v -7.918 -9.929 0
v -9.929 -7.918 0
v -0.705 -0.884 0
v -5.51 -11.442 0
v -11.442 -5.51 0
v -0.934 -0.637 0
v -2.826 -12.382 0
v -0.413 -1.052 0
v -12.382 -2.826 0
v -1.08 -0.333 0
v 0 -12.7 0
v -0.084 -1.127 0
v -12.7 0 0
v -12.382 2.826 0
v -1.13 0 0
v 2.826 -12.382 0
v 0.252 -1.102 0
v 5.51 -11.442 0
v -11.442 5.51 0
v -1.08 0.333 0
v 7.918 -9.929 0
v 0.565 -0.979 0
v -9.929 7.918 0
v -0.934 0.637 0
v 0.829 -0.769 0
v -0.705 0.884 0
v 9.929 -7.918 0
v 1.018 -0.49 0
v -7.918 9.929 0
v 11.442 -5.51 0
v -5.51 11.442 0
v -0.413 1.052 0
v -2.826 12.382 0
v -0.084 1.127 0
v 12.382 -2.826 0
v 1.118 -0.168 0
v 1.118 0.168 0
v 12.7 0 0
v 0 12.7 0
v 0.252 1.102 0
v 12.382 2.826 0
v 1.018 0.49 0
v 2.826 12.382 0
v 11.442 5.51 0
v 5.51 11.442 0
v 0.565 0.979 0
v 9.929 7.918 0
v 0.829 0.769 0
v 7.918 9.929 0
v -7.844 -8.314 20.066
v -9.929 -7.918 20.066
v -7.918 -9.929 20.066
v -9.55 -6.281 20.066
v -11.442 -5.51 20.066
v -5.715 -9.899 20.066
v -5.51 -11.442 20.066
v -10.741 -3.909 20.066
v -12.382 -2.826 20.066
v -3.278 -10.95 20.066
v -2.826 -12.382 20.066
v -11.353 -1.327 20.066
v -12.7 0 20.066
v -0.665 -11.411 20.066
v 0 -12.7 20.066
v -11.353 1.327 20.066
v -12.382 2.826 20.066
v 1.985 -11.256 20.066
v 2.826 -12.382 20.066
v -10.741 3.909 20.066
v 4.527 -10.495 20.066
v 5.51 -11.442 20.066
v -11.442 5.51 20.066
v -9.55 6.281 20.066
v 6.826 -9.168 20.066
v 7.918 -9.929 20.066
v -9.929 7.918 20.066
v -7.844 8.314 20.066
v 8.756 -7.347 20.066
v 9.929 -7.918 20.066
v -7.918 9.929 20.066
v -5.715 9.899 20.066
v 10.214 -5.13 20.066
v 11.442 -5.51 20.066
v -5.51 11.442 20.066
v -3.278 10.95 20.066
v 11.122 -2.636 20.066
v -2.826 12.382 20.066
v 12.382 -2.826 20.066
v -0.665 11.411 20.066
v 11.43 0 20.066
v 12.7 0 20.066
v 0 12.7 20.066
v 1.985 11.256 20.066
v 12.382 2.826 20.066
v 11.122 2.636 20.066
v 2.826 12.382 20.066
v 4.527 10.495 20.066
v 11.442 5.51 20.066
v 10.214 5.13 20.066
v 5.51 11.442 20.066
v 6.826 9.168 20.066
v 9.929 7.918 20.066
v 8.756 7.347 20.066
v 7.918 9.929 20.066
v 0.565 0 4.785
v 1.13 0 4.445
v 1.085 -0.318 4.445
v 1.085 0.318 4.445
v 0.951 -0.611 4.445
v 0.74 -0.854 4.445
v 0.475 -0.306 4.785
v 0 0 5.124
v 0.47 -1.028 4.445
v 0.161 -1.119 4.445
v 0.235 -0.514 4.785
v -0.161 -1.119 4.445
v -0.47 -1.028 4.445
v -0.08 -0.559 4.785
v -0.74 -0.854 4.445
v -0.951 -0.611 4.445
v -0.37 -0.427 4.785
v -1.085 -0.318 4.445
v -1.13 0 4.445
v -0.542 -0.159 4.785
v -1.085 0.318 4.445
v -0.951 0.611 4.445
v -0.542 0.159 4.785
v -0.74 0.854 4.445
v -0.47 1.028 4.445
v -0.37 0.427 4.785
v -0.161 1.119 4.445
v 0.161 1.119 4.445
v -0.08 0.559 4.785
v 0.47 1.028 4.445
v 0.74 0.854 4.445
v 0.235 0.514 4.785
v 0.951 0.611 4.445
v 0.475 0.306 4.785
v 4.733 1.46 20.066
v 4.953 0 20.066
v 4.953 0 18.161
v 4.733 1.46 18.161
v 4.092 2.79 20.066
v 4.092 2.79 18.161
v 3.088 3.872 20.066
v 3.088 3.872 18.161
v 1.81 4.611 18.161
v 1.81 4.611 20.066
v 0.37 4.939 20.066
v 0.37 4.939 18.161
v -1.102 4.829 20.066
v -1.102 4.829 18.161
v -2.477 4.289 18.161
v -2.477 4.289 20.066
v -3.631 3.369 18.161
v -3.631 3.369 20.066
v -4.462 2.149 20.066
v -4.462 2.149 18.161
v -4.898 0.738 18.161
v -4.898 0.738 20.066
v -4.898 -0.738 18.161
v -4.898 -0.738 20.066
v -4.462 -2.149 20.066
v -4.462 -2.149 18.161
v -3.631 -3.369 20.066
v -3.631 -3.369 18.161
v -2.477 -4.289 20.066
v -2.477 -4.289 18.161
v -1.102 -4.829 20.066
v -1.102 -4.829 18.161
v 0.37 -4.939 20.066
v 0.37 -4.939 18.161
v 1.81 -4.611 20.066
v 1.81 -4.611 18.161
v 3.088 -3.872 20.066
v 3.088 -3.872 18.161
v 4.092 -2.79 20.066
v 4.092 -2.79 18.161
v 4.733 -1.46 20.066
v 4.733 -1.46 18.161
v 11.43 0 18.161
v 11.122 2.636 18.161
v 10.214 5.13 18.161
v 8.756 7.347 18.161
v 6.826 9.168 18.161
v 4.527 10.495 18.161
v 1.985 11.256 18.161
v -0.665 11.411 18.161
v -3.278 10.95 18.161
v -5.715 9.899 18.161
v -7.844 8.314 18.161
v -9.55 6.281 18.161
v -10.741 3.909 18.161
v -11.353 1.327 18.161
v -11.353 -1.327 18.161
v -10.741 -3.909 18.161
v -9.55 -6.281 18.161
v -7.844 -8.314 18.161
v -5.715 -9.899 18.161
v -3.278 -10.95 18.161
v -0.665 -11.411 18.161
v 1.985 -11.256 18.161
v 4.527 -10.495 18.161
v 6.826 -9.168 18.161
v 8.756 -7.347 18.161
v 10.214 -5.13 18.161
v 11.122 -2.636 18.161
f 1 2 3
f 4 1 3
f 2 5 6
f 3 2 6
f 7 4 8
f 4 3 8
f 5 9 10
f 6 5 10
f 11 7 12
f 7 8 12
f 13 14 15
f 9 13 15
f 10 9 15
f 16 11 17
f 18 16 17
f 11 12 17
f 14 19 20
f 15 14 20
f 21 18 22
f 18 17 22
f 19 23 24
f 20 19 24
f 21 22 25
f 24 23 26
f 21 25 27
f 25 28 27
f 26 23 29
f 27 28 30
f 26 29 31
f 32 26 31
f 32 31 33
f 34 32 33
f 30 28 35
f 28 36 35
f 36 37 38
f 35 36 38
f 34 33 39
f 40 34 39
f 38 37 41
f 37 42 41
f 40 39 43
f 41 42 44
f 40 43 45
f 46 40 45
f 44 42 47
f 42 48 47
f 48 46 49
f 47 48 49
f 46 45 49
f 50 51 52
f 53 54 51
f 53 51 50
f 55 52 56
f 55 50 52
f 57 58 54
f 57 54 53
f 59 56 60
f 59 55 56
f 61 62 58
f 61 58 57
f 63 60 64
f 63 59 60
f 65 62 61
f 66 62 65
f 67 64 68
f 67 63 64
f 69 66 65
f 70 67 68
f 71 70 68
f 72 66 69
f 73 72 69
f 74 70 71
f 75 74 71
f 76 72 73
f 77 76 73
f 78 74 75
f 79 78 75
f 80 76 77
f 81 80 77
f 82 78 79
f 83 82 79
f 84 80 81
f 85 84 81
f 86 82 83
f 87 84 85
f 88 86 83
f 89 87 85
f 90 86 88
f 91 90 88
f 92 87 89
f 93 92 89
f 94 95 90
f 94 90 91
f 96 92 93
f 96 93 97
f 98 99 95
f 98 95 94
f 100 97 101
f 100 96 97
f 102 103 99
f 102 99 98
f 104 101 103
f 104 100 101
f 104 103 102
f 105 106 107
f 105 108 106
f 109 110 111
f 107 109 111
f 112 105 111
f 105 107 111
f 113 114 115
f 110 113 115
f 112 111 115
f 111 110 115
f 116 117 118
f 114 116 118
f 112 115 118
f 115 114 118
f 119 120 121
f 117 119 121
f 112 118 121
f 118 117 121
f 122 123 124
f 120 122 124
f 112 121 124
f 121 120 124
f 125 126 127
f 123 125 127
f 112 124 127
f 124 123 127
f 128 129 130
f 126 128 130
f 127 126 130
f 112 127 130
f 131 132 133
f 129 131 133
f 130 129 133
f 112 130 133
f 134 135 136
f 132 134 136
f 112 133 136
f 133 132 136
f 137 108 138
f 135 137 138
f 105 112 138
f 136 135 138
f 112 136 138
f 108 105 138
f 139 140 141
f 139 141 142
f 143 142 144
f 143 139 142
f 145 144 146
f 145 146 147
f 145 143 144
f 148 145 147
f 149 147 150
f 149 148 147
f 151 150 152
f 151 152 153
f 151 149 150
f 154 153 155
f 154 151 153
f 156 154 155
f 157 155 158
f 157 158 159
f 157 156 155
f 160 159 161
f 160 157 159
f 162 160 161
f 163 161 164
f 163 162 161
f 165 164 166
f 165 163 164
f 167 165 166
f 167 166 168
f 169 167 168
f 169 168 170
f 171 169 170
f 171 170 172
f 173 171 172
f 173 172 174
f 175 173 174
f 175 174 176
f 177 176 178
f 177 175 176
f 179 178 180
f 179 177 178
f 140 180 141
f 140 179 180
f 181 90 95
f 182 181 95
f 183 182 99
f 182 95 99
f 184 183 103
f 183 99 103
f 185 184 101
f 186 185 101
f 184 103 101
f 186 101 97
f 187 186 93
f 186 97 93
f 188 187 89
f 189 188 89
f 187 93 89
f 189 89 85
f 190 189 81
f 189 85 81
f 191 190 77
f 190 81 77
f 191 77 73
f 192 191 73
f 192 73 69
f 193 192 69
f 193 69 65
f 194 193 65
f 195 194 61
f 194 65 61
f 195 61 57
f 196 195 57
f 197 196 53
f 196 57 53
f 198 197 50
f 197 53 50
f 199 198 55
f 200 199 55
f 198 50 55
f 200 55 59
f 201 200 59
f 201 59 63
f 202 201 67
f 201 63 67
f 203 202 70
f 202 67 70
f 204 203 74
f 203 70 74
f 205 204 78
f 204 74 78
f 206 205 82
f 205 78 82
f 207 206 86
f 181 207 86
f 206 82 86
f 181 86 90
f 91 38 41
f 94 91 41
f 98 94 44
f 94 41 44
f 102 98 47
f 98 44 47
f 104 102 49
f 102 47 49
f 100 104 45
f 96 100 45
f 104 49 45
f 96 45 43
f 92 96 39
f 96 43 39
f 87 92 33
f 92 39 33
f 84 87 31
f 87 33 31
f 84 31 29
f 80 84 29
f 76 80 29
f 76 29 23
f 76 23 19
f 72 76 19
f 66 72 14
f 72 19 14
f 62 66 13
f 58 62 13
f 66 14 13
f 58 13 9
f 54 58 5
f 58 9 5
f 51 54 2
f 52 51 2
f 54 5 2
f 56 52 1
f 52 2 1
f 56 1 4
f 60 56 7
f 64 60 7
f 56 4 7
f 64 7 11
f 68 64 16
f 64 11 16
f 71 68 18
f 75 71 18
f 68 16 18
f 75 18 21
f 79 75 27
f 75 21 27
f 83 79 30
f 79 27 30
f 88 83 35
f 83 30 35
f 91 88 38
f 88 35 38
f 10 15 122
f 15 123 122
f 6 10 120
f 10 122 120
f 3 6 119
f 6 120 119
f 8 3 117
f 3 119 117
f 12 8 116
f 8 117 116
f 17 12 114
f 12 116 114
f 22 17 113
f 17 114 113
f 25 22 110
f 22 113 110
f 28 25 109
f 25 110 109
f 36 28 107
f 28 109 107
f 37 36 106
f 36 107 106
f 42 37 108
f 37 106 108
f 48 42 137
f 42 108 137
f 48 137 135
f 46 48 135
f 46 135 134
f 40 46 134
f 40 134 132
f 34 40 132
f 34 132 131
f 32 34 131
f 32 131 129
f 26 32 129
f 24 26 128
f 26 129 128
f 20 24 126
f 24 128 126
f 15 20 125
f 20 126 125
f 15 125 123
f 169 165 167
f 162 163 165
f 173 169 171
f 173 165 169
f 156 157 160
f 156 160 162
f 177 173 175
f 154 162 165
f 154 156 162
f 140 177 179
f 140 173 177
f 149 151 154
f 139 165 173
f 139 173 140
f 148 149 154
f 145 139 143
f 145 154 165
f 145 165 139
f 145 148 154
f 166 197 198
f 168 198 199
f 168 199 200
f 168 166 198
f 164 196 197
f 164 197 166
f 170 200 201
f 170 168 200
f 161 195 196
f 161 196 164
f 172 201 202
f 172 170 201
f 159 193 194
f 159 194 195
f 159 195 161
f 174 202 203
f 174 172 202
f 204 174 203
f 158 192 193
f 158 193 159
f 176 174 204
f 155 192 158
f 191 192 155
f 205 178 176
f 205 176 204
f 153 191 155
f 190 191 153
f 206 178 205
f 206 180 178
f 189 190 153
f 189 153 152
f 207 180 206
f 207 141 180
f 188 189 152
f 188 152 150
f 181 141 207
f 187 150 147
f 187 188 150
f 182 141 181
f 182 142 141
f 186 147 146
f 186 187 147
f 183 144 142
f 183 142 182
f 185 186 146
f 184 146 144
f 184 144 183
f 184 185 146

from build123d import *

# Parameters (mm, degrees)
F0_R     = 12.7
F1_DEPTH = 20.066
F2_R     = 11.43
F2_R_2   = 4.953
F3_DEPTH = 1.905
F5_D     = 2.2606
F5_DEPTH = 4.445
F5_TIP   = 0.6791527577


with BuildPart() as f1:
    # F0 (on Top) → F1 (new body)
    with BuildSketch(Plane.XY):
        Circle(F0_R)
    extrude(amount=F1_DEPTH)

    # F2 (on face) → F3 (cut)
    with BuildSketch(Plane.XY.offset(20.066)):
        Circle(F2_R)
        Circle(F2_R_2, mode=Mode.SUBTRACT)
    extrude(amount=-F3_DEPTH, mode=Mode.SUBTRACT)

    # F5
    with Locations(Plane(origin=(0, 0, 0), x_dir=(1, 0, 0), z_dir=(0, 0, -1))):
        with Locations((0, 0)):
            Hole(F5_D / 2, depth=F5_DEPTH)
            with Locations((0, 0, -(F5_DEPTH + F5_TIP / 2))):  # 118° drill point
                Cone(0, F5_D / 2, F5_TIP, mode=Mode.SUBTRACT)


solid = f1.part
